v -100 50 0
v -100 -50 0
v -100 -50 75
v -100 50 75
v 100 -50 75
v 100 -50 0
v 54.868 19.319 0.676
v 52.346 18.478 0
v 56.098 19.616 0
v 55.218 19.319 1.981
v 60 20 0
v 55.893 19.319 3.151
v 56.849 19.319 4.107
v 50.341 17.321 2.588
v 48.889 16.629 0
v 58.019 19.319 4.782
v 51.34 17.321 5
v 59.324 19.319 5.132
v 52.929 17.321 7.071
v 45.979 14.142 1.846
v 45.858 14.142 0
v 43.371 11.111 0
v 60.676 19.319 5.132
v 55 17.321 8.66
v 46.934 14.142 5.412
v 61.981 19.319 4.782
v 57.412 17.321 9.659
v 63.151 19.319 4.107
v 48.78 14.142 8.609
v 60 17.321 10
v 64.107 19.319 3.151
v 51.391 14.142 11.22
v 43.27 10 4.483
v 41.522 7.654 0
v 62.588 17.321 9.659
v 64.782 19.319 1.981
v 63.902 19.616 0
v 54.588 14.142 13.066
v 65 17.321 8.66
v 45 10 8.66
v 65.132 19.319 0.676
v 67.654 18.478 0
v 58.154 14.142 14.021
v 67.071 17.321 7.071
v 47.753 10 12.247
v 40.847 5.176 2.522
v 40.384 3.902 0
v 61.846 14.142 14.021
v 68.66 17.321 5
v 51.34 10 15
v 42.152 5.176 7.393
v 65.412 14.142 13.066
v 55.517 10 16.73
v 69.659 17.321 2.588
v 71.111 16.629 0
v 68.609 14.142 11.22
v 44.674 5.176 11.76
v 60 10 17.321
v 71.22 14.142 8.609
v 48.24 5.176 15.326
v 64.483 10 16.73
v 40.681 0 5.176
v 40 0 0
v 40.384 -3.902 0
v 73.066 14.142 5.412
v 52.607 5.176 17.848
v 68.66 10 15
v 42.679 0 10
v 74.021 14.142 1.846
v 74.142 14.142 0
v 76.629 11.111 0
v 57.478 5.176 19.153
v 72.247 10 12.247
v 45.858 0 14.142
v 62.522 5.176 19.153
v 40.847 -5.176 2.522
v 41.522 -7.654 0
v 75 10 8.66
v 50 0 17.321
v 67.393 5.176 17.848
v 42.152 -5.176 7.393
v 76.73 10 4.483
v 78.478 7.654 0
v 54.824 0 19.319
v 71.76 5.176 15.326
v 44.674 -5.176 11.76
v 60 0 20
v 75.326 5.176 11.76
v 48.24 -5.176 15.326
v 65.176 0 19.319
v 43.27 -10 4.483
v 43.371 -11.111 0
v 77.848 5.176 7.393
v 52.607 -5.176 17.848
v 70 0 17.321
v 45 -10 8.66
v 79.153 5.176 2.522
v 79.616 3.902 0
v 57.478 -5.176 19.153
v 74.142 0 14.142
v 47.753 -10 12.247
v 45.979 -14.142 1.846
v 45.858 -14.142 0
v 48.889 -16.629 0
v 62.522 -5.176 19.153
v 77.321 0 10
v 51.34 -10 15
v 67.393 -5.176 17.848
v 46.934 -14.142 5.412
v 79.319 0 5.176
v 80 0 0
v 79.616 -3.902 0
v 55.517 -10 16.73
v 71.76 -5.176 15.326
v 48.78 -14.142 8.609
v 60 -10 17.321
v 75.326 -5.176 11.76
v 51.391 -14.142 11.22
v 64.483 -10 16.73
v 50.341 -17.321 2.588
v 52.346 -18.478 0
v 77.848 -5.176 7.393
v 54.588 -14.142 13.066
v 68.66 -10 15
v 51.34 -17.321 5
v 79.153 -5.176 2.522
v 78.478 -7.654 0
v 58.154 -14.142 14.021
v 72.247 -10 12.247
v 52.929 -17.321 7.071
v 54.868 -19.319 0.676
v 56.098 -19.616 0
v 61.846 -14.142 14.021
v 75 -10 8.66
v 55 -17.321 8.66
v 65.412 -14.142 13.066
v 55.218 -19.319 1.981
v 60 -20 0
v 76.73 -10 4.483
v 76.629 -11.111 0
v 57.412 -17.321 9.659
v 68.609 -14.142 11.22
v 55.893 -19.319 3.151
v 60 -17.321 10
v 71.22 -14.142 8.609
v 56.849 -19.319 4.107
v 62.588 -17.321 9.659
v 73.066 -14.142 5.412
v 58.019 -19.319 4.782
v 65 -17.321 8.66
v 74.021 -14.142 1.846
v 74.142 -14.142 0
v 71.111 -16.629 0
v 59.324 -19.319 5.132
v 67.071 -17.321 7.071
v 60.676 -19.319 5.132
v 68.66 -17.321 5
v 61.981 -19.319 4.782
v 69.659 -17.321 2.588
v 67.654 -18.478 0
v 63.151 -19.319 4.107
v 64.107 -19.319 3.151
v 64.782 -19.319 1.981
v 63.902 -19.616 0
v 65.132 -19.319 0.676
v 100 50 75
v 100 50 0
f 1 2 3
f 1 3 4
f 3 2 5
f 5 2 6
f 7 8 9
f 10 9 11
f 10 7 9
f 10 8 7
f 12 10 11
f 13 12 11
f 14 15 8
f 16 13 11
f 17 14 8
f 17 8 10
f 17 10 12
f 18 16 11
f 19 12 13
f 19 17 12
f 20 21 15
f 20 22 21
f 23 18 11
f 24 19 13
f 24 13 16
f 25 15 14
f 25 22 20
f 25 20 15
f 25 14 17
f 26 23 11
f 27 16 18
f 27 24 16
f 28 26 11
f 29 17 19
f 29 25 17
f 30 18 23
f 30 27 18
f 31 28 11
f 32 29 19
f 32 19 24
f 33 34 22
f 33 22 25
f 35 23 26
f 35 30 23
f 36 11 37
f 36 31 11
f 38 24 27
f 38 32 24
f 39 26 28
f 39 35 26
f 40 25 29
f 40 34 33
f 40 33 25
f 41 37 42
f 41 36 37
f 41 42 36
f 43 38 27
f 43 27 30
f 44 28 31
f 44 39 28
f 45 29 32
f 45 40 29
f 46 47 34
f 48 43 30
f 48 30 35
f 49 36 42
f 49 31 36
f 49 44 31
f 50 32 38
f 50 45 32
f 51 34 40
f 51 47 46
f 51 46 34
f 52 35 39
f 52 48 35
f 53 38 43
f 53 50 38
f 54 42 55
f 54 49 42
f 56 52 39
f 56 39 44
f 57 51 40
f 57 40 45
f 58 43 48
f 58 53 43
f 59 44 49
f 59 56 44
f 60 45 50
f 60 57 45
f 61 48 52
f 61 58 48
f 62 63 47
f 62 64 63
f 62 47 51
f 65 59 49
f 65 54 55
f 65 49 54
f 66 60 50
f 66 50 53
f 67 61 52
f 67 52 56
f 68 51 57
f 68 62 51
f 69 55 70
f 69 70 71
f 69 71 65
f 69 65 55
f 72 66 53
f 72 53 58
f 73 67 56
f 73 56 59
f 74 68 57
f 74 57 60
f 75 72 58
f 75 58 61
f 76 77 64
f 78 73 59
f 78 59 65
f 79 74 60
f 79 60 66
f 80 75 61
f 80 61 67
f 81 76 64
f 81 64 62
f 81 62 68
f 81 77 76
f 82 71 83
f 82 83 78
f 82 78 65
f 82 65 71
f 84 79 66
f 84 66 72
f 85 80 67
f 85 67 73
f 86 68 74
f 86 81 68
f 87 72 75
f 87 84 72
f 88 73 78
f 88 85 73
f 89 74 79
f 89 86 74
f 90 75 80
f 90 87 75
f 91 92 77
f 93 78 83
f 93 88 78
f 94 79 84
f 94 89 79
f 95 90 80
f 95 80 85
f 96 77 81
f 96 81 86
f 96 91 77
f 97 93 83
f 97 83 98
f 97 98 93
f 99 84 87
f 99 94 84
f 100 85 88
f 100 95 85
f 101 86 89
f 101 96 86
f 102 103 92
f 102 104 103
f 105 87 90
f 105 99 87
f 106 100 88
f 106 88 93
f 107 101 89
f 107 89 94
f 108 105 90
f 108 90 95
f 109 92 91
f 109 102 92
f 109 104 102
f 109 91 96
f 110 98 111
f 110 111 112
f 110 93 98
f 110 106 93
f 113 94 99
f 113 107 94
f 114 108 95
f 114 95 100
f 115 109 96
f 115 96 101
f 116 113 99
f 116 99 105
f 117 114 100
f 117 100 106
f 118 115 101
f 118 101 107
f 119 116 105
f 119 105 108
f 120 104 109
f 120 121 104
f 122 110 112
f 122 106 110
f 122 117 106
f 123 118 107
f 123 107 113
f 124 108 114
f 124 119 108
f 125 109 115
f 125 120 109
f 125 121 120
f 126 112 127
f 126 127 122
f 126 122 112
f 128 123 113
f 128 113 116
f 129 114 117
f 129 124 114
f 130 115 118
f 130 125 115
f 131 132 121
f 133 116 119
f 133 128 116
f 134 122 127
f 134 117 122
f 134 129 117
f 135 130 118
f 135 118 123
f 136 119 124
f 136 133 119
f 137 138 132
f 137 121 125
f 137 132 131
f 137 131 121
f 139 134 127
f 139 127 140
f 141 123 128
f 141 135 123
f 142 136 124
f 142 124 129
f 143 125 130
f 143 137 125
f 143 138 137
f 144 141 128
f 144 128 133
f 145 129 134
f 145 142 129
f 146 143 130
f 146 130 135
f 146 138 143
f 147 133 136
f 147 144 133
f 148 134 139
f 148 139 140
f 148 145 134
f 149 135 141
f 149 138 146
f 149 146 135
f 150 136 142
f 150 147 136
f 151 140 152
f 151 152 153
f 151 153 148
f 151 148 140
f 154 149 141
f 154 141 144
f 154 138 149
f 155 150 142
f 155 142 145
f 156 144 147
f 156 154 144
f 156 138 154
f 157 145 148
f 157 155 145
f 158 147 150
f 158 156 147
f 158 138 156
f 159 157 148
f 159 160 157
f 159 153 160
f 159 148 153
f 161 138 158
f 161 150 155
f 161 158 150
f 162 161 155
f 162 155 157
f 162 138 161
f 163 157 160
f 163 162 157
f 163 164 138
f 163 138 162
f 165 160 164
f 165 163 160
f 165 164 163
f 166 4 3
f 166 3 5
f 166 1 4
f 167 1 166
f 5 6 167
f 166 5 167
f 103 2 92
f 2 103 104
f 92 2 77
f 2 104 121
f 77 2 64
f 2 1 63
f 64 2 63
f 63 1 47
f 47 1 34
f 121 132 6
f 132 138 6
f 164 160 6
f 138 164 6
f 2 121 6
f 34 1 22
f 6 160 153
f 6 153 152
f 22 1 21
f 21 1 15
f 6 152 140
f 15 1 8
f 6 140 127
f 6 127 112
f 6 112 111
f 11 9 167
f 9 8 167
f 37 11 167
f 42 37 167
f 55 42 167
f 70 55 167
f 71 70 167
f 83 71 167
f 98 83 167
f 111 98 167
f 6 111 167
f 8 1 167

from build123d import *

# Parameters (mm, degrees)
F0_W     = 200
F0_H     = 100
F1_DEPTH = 75


with BuildPart() as f1:
    # F0 (on Top) → F1 (new body)
    with BuildSketch(Plane.XY):
        Rectangle(F0_W, F0_H)
    extrude(amount=F1_DEPTH)

    # F2 (on face) → F3 (revolve, cut)
    with BuildSketch(Plane(origin=(0, 0, 0), x_dir=(1, 0, 0), z_dir=(0, 0, -1))):
        with BuildLine():
            Line((60, 20), (60, -20))
            ThreePointArc((60, -20), (80, 0), (60, 20))
        make_face()
    revolve(axis=Axis((60, 0, 0), (0, 1, 0)), mode=Mode.SUBTRACT)


solid = f1.part
